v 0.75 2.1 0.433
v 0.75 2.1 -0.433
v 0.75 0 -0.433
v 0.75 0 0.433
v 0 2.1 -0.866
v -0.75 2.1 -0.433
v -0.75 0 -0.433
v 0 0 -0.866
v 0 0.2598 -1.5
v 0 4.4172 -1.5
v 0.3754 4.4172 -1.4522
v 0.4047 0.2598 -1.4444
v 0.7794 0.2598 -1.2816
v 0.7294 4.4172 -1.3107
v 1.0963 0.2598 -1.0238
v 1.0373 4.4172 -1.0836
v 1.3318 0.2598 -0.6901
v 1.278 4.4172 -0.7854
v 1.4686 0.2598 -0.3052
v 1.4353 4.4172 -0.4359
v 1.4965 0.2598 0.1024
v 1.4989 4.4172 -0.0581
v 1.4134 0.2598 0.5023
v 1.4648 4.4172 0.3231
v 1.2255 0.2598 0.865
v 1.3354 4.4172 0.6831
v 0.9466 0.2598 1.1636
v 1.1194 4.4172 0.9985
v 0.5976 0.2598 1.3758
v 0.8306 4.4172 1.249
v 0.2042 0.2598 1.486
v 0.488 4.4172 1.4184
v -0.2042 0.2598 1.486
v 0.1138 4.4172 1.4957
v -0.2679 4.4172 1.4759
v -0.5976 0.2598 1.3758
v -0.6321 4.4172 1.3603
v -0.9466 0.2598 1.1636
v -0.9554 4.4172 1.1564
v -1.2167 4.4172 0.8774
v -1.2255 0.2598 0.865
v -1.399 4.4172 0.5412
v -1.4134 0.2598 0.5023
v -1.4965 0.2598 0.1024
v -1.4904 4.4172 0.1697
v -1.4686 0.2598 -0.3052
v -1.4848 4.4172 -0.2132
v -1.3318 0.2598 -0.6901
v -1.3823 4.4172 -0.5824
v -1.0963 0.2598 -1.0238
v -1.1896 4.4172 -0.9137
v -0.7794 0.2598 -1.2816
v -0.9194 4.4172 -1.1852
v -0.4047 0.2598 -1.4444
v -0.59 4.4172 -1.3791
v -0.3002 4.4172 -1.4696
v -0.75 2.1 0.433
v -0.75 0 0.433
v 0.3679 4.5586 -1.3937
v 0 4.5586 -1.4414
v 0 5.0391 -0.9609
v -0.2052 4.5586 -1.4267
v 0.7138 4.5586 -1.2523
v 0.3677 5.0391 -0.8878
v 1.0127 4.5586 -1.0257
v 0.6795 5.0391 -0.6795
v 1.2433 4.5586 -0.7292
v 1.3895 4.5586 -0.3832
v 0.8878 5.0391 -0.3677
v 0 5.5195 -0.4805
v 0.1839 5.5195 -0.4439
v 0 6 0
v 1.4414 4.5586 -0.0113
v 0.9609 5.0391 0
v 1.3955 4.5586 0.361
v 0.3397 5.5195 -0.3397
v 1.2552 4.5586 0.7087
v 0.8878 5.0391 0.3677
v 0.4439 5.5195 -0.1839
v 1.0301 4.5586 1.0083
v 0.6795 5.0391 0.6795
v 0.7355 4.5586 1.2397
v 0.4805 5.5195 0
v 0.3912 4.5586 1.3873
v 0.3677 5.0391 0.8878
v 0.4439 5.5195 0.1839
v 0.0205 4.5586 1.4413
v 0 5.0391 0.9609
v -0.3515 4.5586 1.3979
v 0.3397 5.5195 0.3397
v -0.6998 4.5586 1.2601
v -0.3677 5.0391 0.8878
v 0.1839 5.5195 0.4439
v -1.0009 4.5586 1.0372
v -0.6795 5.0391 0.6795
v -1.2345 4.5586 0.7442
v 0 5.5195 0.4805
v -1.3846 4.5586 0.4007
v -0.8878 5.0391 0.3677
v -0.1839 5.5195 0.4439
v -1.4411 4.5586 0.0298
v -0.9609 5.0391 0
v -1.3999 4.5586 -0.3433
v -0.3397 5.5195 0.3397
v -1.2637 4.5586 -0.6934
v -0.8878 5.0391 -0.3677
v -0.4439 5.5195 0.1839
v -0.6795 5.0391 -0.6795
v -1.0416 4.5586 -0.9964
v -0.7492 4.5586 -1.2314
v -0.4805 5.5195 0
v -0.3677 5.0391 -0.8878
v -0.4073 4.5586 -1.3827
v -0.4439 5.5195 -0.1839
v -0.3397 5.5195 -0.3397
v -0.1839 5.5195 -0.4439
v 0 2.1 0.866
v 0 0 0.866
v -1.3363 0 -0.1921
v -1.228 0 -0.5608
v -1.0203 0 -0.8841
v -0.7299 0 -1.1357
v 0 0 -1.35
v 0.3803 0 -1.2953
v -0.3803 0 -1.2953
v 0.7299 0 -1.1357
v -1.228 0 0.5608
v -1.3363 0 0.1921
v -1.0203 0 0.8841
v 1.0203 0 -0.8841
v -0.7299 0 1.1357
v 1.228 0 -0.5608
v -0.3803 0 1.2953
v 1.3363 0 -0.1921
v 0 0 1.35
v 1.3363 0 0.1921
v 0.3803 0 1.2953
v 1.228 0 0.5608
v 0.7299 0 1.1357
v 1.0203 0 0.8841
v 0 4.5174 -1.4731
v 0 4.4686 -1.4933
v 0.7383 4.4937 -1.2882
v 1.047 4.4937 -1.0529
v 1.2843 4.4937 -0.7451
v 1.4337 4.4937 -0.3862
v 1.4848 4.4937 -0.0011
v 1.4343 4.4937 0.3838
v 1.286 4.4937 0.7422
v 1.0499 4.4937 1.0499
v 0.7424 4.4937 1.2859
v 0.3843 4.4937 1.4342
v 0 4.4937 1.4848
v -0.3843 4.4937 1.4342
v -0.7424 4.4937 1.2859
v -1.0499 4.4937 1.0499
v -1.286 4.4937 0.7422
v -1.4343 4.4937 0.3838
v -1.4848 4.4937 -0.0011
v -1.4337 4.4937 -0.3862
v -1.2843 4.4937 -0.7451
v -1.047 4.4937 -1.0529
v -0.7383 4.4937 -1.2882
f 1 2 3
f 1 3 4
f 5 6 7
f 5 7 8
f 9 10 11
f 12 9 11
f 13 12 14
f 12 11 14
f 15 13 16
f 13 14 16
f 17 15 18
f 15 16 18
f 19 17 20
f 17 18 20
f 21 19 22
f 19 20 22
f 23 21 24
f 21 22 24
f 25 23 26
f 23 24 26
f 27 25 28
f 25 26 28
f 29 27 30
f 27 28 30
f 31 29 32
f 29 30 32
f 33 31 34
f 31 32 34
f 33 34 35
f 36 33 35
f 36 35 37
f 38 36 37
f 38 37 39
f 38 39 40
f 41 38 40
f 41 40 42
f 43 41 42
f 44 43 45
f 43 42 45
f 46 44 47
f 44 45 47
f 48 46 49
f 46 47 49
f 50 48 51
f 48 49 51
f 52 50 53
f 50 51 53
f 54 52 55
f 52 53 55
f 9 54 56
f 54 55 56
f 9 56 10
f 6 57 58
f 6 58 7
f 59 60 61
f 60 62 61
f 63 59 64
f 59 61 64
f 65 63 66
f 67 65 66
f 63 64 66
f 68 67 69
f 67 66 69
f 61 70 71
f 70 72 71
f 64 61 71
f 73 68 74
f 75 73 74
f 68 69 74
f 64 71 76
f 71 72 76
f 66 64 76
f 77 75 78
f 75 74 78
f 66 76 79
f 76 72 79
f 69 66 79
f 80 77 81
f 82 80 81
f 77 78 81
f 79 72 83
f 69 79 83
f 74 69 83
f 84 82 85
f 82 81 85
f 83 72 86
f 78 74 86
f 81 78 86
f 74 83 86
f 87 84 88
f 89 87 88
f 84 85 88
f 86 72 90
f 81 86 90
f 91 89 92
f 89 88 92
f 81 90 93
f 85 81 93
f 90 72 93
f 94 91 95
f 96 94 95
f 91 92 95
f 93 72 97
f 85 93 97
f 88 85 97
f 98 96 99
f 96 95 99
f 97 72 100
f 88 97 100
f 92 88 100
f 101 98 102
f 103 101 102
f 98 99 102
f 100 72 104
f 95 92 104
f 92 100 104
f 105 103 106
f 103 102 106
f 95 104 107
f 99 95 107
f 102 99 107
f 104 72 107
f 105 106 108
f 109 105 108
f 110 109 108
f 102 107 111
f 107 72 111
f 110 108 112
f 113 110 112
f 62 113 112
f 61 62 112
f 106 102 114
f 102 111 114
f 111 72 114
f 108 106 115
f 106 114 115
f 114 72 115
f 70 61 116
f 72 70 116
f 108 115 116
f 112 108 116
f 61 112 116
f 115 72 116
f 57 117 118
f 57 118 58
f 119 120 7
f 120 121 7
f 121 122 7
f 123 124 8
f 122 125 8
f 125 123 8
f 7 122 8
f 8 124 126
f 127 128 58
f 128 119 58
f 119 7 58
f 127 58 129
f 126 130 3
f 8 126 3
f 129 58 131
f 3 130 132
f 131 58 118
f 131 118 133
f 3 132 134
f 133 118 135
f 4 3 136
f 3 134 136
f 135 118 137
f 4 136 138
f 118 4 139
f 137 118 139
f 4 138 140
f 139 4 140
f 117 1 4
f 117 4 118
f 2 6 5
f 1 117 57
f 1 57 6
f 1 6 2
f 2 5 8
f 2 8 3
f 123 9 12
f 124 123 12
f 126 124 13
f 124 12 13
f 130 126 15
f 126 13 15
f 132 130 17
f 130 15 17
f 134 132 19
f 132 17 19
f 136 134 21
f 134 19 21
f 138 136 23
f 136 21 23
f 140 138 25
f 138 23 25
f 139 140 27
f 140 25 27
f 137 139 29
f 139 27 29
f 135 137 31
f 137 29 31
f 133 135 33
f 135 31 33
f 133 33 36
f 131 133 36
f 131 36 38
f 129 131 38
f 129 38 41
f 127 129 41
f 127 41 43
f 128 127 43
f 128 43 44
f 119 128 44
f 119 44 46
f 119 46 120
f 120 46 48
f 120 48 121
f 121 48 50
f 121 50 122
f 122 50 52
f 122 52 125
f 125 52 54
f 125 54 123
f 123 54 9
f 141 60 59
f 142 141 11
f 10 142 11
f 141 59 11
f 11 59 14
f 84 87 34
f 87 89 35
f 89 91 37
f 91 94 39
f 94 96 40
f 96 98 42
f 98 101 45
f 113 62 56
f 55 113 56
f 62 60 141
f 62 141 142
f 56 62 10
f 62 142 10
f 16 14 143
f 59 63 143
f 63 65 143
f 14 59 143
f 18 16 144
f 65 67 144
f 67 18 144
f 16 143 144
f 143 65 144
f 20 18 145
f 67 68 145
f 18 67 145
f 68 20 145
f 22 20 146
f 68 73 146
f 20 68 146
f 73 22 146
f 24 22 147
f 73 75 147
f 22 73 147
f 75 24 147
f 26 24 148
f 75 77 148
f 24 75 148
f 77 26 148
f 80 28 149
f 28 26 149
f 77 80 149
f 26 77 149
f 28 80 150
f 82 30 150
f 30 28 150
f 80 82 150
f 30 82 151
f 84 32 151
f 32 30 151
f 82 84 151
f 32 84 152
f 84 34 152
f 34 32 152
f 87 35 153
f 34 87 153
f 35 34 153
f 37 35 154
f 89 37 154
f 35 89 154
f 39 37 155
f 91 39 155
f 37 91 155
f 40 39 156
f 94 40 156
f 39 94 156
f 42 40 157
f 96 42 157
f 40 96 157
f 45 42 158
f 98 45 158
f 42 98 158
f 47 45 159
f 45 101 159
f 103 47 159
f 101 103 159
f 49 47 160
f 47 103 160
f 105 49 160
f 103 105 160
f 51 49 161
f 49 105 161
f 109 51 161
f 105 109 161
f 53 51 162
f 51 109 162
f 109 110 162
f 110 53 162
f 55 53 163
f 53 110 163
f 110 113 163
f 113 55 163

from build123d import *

# Parameters (mm, degrees)
FILLET1_R               = 0.2
CUT_EXTRUDE1_DEPTH      = 7.363961172
CUT_EXTRUDE1_DEPTH_BACK = 2.1
CHAMFER1_SIZE           = 0.15
CHAMFER1_SIZE2          = 0.259807621


with BuildPart() as part:
    # Sketch1 → Revolve1 (revolve)
    with BuildSketch(Plane.XY, mode=Mode.PRIVATE) as revolve1_sk:
        Polygon((1.5, 4.5), (0, 6), (0, 3.478320035), (0, 0), (1.5, 0), align=None)
    revolve(revolve1_sk.sketch.rotate(Axis((0, 6, 0), (0, -1, 0)), 270), axis=Axis((0, 6, 0), (0, -1, 0)))

    # Fillet1
    fillet1_edges = [part.edges().sort_by_distance(p)[0] for p in [
        (0, 4.5, 1.5),
    ]]
    fillet(fillet1_edges, radius=FILLET1_R)

    # Sketch2 → Cut-Extrude1 (cut, two sides: drawn at the far end of the back side and taken through both)
    with BuildSketch(Plane.XZ.offset(-CUT_EXTRUDE1_DEPTH_BACK)):
        Polygon((0, 0.866025404), (-0.75, 0.433012702), (-0.75, -0.433012702), (0, -0.866025404), (0.75, -0.433012702), (0.75, 0.433012702), align=None)
    extrude(amount=CUT_EXTRUDE1_DEPTH + CUT_EXTRUDE1_DEPTH_BACK, mode=Mode.SUBTRACT)

    # Chamfer1
    chamfer1_edges = [part.edges().sort_by_distance(p)[0] for p in [
        (0, 0, 1.5),
    ]]
    chamfer1_side = [part.faces().sort_by_distance(p)[0] for p in [
        (0, 0, 1.457573593),
    ]]
    chamfer(chamfer1_edges, length=CHAMFER1_SIZE, length2=CHAMFER1_SIZE2, reference=chamfer1_side[0])


solid = part.part
